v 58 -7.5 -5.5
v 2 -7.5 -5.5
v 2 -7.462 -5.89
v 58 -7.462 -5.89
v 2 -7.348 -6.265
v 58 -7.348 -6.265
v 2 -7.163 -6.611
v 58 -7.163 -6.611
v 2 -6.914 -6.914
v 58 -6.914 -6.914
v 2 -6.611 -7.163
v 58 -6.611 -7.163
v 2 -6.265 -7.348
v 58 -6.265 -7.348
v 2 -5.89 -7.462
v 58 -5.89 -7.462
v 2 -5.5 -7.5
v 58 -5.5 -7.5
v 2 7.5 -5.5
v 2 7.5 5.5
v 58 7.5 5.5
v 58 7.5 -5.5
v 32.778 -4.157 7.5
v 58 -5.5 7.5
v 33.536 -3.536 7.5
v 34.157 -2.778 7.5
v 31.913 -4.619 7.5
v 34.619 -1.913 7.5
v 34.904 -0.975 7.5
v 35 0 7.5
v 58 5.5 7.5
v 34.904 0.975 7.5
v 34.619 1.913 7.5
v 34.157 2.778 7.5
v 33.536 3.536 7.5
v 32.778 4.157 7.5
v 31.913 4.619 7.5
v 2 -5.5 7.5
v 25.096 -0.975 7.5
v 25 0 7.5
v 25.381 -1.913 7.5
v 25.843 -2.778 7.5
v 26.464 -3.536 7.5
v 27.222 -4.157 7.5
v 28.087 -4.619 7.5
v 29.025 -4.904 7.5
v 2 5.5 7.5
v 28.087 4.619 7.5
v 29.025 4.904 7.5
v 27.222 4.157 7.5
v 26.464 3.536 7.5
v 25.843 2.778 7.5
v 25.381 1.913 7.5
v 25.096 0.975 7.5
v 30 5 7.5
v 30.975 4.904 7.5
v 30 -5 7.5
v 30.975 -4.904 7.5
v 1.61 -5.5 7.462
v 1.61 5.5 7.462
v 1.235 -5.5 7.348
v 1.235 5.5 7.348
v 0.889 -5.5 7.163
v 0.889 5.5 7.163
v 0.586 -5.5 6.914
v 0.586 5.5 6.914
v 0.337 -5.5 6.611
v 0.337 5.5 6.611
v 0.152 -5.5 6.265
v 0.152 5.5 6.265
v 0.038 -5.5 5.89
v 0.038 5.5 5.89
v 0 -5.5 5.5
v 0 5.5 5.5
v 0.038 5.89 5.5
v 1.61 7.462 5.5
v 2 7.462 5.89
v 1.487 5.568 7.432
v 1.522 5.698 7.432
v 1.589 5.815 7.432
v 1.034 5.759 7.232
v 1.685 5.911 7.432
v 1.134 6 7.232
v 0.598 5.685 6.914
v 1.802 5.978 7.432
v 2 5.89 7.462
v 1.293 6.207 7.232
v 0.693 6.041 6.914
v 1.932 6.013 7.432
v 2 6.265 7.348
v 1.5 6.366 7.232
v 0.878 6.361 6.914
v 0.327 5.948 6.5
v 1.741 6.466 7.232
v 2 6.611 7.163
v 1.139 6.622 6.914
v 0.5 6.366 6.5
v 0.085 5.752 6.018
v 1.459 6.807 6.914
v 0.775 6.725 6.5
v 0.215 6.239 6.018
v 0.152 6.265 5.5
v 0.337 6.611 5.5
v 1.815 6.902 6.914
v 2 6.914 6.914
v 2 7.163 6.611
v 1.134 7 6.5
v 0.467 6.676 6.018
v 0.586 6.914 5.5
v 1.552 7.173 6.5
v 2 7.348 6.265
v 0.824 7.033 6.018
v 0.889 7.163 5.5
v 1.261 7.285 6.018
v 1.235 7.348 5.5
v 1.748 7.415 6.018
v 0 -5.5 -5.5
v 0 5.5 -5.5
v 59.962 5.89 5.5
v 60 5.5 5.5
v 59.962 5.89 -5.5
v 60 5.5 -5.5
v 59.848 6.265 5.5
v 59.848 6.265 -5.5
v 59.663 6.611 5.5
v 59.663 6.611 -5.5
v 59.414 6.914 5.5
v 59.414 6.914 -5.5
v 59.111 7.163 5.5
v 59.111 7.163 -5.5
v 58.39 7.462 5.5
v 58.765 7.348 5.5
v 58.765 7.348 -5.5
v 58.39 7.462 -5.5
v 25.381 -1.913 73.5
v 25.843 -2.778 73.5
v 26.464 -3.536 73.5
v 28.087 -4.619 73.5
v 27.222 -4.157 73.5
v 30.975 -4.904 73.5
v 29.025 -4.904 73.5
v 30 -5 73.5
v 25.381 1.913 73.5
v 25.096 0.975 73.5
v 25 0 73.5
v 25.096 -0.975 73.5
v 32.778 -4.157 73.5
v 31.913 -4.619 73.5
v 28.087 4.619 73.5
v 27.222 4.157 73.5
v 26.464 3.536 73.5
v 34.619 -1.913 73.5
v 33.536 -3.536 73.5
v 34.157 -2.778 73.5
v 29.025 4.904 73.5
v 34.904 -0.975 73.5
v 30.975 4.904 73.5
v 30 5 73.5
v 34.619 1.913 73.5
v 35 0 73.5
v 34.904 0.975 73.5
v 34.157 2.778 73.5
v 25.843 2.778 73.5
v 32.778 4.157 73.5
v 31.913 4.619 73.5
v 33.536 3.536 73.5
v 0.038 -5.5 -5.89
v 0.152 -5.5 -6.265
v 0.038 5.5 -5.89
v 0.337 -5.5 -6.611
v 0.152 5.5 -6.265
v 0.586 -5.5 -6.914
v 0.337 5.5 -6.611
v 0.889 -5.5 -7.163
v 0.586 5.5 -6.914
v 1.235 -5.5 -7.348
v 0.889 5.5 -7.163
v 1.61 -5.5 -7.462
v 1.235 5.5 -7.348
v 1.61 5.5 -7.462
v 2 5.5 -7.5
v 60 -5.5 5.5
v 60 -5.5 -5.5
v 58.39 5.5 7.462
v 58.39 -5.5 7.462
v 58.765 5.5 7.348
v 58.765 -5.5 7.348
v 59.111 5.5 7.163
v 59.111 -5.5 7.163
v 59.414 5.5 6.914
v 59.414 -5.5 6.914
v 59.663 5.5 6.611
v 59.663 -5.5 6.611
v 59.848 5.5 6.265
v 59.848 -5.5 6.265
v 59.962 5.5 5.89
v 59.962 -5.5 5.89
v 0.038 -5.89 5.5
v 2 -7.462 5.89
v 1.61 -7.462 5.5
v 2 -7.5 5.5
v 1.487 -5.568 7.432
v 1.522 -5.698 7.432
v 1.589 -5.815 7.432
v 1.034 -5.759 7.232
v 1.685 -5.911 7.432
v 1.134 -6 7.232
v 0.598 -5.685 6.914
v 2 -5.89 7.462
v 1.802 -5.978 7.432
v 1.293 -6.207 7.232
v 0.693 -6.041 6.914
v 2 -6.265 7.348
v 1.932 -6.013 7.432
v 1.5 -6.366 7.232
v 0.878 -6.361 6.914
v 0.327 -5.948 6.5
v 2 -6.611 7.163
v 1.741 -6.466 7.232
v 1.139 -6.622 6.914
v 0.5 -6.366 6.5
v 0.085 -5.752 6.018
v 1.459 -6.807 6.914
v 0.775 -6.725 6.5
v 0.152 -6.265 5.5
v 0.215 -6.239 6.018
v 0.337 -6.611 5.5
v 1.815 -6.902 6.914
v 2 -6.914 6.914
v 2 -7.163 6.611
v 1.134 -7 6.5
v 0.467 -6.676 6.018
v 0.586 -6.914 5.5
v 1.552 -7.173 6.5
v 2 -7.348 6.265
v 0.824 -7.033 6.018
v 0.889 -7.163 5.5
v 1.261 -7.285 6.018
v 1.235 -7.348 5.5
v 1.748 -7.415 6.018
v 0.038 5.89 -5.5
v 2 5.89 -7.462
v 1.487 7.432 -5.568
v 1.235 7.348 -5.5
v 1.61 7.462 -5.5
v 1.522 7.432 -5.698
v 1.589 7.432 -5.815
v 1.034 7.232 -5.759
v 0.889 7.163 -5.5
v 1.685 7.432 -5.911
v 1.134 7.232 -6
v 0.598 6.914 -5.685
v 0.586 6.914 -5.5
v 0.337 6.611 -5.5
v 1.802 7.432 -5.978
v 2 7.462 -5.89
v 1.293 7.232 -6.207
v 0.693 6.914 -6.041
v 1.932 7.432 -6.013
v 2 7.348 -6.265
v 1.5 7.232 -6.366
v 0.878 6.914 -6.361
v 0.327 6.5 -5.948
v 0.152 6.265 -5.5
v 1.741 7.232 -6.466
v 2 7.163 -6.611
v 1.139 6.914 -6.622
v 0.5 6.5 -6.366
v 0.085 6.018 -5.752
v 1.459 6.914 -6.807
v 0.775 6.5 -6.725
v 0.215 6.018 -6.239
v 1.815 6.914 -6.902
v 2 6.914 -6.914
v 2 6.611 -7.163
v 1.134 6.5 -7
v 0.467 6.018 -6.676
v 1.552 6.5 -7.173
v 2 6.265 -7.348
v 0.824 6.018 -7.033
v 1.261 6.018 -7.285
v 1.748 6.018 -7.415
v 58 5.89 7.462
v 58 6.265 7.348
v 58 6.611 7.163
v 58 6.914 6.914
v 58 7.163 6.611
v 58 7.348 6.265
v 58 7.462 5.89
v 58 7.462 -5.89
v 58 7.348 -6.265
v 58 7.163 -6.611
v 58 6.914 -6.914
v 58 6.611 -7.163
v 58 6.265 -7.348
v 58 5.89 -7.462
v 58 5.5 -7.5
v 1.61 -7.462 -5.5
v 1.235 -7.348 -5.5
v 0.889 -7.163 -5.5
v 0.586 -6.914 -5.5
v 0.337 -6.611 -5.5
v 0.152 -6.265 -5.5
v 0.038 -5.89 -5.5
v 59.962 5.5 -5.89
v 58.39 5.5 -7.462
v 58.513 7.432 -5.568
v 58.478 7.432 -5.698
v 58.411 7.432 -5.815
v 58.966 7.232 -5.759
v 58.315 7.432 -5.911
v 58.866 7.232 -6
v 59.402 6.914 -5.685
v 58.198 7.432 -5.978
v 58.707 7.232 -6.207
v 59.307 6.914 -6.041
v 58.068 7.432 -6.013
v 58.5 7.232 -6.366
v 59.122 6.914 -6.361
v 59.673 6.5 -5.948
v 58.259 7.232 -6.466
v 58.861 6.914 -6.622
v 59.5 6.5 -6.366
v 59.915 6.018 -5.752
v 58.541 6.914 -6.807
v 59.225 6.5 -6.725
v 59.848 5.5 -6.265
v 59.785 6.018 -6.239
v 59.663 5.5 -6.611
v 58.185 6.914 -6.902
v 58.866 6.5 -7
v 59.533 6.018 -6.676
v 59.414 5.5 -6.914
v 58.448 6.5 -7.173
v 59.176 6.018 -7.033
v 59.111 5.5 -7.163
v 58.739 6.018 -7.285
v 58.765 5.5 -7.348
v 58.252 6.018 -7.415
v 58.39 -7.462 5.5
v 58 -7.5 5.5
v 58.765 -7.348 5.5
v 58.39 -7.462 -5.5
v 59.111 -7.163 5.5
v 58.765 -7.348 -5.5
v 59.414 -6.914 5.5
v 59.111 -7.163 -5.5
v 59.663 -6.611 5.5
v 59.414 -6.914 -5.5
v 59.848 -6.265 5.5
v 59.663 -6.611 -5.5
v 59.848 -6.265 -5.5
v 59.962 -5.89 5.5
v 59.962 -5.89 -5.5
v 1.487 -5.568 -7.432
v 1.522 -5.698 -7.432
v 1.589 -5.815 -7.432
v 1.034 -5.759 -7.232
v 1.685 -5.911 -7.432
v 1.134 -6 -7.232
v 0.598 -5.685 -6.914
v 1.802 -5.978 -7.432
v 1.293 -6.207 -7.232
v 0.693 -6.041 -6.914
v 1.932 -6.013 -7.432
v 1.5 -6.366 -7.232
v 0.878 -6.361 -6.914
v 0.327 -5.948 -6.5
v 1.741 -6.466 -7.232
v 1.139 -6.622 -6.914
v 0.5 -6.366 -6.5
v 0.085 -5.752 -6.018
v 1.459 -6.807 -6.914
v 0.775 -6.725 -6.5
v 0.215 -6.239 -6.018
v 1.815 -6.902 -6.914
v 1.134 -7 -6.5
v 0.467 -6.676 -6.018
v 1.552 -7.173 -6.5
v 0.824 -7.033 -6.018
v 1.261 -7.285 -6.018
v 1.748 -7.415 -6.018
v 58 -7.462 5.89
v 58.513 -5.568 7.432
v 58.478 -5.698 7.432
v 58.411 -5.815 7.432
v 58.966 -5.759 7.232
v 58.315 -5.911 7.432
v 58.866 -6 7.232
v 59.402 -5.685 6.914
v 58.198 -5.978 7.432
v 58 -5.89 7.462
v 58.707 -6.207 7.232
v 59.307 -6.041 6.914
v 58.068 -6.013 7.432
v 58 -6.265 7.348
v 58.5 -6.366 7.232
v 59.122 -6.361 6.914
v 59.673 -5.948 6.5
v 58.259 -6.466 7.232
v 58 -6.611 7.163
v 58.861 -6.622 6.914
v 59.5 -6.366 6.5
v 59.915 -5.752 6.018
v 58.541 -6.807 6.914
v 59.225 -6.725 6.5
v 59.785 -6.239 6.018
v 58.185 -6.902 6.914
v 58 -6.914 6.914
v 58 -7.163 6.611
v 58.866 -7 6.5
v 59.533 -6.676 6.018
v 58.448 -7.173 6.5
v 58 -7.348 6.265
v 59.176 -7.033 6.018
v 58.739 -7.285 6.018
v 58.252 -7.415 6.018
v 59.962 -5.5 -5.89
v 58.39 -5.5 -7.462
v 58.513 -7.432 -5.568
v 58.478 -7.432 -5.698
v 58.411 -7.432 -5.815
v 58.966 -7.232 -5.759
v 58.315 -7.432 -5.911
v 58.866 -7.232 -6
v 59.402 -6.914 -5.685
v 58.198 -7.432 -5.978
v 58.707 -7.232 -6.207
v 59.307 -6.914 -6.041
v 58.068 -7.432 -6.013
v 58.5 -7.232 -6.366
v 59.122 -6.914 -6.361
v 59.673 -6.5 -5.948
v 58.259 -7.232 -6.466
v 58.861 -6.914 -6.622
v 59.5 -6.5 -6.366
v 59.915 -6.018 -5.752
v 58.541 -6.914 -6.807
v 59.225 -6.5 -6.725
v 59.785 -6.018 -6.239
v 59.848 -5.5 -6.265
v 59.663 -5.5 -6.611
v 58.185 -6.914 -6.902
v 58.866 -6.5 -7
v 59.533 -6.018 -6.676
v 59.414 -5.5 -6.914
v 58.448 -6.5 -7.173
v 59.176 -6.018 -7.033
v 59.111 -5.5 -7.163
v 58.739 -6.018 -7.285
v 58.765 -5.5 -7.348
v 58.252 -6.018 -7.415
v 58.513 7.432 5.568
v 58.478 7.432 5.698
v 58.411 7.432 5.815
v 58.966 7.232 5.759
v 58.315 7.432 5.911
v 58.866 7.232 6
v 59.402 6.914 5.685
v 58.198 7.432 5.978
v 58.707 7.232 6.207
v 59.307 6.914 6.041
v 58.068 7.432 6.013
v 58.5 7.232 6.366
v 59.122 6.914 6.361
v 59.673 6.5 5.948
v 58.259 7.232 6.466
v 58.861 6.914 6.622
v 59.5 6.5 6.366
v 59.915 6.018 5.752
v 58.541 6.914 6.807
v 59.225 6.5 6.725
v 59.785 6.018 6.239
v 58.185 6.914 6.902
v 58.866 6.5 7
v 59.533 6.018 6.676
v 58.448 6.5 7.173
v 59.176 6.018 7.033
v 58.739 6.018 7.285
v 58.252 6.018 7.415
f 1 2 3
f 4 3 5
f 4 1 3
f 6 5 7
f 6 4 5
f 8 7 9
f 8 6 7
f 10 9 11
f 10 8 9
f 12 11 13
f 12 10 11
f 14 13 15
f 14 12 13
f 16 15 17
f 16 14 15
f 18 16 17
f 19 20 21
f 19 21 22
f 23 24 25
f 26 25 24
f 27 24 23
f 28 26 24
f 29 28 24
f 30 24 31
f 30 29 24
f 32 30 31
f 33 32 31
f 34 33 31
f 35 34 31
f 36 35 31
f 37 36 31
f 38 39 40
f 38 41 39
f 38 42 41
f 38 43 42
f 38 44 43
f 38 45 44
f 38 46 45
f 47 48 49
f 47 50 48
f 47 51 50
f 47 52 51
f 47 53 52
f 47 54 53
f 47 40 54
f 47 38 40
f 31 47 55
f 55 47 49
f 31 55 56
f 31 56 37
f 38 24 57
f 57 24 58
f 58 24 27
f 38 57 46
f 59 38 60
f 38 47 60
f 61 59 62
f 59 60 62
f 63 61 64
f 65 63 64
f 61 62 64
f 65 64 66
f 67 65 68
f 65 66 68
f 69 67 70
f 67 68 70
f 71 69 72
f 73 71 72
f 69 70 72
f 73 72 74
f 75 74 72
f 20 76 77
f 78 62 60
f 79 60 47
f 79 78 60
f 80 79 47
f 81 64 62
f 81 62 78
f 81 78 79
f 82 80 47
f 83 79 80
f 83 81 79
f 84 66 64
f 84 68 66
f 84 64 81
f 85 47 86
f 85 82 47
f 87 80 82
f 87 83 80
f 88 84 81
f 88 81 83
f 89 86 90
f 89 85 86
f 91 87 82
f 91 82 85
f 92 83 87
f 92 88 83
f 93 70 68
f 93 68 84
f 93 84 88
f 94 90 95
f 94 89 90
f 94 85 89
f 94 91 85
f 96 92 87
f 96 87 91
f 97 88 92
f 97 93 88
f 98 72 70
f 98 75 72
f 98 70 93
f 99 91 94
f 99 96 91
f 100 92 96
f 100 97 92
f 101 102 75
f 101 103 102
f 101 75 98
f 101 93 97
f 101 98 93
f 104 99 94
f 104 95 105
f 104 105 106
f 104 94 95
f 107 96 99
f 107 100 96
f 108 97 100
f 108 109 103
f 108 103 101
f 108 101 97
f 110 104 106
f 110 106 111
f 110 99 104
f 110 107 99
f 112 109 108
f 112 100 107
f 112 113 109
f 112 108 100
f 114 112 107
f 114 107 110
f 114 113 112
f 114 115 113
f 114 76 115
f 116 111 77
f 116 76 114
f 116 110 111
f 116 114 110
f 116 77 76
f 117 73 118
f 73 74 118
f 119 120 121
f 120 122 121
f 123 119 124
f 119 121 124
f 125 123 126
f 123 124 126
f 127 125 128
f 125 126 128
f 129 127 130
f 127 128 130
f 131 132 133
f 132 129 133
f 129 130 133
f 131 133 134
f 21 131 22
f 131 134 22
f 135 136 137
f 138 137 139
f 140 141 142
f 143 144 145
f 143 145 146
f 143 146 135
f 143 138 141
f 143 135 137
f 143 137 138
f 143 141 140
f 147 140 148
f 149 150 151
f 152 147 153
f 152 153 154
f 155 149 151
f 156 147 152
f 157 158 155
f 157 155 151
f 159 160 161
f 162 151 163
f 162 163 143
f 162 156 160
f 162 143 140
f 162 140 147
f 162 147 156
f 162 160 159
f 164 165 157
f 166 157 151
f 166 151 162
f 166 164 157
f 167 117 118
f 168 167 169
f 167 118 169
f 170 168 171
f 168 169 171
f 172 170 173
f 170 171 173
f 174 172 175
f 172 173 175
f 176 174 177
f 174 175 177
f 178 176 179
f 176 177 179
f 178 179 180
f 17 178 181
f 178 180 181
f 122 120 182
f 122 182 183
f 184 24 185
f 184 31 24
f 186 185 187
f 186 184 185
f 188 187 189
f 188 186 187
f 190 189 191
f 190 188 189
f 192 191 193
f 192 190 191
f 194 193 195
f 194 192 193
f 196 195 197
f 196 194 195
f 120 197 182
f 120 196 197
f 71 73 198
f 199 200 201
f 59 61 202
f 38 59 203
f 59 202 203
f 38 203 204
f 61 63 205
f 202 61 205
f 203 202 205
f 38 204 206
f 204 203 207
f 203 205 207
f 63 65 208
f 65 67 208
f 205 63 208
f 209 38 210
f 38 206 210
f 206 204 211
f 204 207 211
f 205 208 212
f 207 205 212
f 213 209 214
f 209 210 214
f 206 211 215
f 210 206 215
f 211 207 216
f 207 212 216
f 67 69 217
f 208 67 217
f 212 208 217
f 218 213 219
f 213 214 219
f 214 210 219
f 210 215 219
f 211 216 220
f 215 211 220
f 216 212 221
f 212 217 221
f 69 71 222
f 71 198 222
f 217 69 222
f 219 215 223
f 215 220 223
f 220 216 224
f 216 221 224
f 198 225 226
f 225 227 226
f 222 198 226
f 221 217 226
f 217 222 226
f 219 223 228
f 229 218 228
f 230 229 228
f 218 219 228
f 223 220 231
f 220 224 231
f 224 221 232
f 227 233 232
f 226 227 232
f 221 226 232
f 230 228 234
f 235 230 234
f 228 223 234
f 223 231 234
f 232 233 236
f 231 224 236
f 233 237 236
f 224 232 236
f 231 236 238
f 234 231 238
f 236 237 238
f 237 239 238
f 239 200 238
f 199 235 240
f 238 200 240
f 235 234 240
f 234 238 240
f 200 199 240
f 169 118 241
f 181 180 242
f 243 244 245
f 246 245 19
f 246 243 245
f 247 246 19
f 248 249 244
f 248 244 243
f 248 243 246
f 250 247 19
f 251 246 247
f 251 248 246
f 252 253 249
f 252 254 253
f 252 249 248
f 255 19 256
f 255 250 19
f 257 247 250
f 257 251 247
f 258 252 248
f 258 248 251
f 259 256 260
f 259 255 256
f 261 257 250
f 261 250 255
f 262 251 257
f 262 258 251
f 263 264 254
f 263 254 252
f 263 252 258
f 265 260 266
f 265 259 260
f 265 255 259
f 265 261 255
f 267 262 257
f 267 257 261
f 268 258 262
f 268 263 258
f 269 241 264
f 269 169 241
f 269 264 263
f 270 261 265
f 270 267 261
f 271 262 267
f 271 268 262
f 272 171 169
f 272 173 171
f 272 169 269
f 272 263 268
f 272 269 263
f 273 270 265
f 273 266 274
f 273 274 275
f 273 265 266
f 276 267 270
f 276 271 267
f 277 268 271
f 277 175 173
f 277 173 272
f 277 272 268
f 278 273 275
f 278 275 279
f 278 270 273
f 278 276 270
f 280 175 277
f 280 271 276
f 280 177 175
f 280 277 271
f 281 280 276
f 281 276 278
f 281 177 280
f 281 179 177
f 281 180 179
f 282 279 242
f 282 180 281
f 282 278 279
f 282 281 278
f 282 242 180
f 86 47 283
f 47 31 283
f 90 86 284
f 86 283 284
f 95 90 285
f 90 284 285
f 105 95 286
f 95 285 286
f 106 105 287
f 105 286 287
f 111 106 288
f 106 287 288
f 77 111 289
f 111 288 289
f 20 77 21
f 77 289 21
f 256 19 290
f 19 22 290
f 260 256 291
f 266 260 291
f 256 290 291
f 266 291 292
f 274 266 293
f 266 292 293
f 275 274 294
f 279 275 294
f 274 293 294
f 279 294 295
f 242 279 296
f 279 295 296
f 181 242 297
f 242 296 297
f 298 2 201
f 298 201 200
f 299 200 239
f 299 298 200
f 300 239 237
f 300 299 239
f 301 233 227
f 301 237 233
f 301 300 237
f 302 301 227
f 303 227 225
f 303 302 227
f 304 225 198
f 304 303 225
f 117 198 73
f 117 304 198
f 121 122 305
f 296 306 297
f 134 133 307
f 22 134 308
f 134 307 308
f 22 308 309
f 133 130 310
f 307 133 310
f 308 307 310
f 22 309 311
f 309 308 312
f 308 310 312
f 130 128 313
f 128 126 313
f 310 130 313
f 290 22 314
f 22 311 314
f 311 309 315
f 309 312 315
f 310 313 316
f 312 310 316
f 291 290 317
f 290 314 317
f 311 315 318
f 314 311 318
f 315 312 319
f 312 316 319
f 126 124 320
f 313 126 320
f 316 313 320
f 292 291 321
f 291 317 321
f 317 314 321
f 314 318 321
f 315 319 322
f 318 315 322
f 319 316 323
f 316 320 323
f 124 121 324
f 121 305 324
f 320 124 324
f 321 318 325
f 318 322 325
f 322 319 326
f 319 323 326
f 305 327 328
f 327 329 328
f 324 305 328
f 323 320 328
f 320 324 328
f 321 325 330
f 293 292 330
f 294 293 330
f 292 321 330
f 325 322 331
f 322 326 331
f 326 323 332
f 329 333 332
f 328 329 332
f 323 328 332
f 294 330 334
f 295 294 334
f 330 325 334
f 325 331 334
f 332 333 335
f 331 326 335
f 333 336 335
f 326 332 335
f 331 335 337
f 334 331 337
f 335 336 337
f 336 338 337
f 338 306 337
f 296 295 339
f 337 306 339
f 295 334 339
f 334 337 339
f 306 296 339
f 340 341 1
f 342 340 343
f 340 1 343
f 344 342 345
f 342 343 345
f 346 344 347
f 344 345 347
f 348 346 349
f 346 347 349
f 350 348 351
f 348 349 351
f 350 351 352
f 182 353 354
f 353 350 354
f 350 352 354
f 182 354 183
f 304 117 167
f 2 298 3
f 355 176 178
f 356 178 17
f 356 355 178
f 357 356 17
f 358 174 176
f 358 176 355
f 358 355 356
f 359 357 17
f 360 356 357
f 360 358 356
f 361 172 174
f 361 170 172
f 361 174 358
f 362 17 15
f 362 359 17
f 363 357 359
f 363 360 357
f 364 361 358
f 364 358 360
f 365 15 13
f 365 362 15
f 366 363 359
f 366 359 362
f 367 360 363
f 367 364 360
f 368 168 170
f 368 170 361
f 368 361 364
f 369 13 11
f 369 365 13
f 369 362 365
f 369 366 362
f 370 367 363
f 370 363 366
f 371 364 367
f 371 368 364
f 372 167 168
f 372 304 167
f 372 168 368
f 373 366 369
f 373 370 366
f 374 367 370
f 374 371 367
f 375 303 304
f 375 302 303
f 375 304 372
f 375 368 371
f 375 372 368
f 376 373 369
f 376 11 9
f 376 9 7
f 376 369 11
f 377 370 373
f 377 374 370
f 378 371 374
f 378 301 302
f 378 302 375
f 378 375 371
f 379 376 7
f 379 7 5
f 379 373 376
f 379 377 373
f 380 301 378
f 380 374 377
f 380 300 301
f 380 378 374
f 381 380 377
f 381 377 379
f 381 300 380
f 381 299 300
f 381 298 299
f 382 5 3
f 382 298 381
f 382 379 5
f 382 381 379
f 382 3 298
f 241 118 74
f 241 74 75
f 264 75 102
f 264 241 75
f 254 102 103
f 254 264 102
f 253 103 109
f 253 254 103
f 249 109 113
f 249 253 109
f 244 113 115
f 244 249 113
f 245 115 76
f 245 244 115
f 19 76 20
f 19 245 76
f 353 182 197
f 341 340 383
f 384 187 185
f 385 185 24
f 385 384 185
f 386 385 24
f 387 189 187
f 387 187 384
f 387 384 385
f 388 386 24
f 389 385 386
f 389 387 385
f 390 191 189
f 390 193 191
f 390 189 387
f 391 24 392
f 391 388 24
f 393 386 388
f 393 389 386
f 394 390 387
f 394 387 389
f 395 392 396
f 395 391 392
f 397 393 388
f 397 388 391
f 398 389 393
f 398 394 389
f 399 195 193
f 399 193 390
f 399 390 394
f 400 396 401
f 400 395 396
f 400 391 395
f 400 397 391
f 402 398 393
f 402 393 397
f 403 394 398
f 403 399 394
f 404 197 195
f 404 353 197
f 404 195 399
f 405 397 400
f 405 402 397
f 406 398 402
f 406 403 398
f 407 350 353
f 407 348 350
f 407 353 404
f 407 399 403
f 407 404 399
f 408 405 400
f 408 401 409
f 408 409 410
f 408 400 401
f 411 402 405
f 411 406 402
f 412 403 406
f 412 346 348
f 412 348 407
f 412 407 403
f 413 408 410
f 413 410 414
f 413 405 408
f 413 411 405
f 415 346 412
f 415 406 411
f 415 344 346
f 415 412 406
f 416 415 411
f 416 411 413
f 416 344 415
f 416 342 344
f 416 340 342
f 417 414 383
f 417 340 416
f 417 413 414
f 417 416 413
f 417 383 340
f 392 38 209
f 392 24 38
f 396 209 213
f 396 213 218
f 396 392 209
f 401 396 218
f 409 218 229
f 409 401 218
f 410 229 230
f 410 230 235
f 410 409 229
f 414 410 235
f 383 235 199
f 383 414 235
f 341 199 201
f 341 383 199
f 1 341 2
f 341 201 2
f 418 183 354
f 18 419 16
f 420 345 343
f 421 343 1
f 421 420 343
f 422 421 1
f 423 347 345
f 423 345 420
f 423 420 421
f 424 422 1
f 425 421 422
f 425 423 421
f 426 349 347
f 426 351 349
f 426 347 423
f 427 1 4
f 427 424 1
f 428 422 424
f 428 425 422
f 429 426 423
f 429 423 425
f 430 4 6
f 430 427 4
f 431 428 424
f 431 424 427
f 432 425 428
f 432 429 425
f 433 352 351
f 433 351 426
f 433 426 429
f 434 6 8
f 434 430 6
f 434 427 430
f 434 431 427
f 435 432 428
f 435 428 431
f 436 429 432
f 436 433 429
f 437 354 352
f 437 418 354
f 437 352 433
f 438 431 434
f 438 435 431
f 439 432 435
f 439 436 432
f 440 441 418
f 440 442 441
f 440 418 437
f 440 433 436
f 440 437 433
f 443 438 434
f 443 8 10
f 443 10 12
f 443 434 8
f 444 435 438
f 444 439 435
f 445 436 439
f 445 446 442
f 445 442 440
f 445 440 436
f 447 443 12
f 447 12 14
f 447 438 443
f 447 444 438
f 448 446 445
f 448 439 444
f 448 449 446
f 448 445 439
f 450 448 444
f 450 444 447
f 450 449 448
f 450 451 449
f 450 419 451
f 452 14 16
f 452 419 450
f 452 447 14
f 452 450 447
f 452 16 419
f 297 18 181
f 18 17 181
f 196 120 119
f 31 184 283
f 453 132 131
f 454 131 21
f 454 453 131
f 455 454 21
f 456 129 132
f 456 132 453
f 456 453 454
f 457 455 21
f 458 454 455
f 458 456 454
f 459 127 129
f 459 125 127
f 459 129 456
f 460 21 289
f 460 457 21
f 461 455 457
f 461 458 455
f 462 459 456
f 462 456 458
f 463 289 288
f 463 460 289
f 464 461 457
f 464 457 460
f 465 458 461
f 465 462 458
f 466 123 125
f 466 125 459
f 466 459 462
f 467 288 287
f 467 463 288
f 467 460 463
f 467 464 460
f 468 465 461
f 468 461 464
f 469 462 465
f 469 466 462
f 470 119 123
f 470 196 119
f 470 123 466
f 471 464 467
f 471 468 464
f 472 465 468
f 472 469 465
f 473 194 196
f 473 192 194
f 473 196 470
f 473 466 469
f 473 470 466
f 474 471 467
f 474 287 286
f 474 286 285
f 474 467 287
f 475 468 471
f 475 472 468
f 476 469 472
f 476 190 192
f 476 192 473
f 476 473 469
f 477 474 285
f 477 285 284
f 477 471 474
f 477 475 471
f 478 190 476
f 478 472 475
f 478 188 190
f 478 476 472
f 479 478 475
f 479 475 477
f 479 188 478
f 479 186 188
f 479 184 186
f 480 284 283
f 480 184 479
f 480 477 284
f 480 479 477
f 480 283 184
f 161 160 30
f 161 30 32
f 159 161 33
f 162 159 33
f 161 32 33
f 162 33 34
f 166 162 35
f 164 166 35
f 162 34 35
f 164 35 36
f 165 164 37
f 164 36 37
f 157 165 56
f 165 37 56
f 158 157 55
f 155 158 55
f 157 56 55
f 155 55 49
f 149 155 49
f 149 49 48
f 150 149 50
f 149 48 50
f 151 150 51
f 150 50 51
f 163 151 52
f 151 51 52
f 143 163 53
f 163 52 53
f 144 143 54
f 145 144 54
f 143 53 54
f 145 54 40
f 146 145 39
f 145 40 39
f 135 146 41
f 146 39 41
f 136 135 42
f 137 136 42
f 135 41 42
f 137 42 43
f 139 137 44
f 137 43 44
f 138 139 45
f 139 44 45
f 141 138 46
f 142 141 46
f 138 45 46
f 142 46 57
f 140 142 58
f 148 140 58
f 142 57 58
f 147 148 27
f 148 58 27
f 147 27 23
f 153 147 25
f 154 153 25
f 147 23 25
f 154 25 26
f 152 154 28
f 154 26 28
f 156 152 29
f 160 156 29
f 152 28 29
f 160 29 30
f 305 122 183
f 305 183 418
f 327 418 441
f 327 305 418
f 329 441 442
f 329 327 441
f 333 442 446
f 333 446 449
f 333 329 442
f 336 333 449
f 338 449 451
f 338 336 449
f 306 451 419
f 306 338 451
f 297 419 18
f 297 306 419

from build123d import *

# Parameters (mm, degrees)
SKETCH1_W           = 15
SKETCH1_H           = 15
BOSS_EXTRUDE1_DEPTH = 60
SKETCH3_R           = 5
BOSS_EXTRUDE2_DEPTH = 66
FILLET1_R           = 2


with BuildPart() as part:
    # Sketch1 → Boss-Extrude1 (new body)
    with BuildSketch(Plane(origin=(0, 0, 0), x_dir=(0, 0, -1), z_dir=(1, 0, 0))):
        Rectangle(SKETCH1_W, SKETCH1_H)
    extrude(amount=BOSS_EXTRUDE1_DEPTH)

    # Sketch3 → Boss-Extrude2 (add)
    with BuildSketch(Plane.XY.offset(7.5)):
        with Locations((30, 0)):
            Circle(SKETCH3_R)
    extrude(amount=BOSS_EXTRUDE2_DEPTH)

    # Fillet1
    fillet1_edges = [part.edges().sort_by_distance(p)[0] for p in [
        (60, 0, -7.5),
        (60, -7.5, 0),
        (60, 0, 7.5),
        (0, -7.5, 0),
        (0, 0, -7.5),
        (0, 7.5, 0),
        (0, 0, 7.5),
        (60, 7.5, 0),
        (30, -7.5, 7.5),
        (30, -7.5, -7.5),
        (30, 7.5, -7.5),
        (30, 7.5, 7.5),
    ]]
    fillet(fillet1_edges, radius=FILLET1_R)


solid = part.part
